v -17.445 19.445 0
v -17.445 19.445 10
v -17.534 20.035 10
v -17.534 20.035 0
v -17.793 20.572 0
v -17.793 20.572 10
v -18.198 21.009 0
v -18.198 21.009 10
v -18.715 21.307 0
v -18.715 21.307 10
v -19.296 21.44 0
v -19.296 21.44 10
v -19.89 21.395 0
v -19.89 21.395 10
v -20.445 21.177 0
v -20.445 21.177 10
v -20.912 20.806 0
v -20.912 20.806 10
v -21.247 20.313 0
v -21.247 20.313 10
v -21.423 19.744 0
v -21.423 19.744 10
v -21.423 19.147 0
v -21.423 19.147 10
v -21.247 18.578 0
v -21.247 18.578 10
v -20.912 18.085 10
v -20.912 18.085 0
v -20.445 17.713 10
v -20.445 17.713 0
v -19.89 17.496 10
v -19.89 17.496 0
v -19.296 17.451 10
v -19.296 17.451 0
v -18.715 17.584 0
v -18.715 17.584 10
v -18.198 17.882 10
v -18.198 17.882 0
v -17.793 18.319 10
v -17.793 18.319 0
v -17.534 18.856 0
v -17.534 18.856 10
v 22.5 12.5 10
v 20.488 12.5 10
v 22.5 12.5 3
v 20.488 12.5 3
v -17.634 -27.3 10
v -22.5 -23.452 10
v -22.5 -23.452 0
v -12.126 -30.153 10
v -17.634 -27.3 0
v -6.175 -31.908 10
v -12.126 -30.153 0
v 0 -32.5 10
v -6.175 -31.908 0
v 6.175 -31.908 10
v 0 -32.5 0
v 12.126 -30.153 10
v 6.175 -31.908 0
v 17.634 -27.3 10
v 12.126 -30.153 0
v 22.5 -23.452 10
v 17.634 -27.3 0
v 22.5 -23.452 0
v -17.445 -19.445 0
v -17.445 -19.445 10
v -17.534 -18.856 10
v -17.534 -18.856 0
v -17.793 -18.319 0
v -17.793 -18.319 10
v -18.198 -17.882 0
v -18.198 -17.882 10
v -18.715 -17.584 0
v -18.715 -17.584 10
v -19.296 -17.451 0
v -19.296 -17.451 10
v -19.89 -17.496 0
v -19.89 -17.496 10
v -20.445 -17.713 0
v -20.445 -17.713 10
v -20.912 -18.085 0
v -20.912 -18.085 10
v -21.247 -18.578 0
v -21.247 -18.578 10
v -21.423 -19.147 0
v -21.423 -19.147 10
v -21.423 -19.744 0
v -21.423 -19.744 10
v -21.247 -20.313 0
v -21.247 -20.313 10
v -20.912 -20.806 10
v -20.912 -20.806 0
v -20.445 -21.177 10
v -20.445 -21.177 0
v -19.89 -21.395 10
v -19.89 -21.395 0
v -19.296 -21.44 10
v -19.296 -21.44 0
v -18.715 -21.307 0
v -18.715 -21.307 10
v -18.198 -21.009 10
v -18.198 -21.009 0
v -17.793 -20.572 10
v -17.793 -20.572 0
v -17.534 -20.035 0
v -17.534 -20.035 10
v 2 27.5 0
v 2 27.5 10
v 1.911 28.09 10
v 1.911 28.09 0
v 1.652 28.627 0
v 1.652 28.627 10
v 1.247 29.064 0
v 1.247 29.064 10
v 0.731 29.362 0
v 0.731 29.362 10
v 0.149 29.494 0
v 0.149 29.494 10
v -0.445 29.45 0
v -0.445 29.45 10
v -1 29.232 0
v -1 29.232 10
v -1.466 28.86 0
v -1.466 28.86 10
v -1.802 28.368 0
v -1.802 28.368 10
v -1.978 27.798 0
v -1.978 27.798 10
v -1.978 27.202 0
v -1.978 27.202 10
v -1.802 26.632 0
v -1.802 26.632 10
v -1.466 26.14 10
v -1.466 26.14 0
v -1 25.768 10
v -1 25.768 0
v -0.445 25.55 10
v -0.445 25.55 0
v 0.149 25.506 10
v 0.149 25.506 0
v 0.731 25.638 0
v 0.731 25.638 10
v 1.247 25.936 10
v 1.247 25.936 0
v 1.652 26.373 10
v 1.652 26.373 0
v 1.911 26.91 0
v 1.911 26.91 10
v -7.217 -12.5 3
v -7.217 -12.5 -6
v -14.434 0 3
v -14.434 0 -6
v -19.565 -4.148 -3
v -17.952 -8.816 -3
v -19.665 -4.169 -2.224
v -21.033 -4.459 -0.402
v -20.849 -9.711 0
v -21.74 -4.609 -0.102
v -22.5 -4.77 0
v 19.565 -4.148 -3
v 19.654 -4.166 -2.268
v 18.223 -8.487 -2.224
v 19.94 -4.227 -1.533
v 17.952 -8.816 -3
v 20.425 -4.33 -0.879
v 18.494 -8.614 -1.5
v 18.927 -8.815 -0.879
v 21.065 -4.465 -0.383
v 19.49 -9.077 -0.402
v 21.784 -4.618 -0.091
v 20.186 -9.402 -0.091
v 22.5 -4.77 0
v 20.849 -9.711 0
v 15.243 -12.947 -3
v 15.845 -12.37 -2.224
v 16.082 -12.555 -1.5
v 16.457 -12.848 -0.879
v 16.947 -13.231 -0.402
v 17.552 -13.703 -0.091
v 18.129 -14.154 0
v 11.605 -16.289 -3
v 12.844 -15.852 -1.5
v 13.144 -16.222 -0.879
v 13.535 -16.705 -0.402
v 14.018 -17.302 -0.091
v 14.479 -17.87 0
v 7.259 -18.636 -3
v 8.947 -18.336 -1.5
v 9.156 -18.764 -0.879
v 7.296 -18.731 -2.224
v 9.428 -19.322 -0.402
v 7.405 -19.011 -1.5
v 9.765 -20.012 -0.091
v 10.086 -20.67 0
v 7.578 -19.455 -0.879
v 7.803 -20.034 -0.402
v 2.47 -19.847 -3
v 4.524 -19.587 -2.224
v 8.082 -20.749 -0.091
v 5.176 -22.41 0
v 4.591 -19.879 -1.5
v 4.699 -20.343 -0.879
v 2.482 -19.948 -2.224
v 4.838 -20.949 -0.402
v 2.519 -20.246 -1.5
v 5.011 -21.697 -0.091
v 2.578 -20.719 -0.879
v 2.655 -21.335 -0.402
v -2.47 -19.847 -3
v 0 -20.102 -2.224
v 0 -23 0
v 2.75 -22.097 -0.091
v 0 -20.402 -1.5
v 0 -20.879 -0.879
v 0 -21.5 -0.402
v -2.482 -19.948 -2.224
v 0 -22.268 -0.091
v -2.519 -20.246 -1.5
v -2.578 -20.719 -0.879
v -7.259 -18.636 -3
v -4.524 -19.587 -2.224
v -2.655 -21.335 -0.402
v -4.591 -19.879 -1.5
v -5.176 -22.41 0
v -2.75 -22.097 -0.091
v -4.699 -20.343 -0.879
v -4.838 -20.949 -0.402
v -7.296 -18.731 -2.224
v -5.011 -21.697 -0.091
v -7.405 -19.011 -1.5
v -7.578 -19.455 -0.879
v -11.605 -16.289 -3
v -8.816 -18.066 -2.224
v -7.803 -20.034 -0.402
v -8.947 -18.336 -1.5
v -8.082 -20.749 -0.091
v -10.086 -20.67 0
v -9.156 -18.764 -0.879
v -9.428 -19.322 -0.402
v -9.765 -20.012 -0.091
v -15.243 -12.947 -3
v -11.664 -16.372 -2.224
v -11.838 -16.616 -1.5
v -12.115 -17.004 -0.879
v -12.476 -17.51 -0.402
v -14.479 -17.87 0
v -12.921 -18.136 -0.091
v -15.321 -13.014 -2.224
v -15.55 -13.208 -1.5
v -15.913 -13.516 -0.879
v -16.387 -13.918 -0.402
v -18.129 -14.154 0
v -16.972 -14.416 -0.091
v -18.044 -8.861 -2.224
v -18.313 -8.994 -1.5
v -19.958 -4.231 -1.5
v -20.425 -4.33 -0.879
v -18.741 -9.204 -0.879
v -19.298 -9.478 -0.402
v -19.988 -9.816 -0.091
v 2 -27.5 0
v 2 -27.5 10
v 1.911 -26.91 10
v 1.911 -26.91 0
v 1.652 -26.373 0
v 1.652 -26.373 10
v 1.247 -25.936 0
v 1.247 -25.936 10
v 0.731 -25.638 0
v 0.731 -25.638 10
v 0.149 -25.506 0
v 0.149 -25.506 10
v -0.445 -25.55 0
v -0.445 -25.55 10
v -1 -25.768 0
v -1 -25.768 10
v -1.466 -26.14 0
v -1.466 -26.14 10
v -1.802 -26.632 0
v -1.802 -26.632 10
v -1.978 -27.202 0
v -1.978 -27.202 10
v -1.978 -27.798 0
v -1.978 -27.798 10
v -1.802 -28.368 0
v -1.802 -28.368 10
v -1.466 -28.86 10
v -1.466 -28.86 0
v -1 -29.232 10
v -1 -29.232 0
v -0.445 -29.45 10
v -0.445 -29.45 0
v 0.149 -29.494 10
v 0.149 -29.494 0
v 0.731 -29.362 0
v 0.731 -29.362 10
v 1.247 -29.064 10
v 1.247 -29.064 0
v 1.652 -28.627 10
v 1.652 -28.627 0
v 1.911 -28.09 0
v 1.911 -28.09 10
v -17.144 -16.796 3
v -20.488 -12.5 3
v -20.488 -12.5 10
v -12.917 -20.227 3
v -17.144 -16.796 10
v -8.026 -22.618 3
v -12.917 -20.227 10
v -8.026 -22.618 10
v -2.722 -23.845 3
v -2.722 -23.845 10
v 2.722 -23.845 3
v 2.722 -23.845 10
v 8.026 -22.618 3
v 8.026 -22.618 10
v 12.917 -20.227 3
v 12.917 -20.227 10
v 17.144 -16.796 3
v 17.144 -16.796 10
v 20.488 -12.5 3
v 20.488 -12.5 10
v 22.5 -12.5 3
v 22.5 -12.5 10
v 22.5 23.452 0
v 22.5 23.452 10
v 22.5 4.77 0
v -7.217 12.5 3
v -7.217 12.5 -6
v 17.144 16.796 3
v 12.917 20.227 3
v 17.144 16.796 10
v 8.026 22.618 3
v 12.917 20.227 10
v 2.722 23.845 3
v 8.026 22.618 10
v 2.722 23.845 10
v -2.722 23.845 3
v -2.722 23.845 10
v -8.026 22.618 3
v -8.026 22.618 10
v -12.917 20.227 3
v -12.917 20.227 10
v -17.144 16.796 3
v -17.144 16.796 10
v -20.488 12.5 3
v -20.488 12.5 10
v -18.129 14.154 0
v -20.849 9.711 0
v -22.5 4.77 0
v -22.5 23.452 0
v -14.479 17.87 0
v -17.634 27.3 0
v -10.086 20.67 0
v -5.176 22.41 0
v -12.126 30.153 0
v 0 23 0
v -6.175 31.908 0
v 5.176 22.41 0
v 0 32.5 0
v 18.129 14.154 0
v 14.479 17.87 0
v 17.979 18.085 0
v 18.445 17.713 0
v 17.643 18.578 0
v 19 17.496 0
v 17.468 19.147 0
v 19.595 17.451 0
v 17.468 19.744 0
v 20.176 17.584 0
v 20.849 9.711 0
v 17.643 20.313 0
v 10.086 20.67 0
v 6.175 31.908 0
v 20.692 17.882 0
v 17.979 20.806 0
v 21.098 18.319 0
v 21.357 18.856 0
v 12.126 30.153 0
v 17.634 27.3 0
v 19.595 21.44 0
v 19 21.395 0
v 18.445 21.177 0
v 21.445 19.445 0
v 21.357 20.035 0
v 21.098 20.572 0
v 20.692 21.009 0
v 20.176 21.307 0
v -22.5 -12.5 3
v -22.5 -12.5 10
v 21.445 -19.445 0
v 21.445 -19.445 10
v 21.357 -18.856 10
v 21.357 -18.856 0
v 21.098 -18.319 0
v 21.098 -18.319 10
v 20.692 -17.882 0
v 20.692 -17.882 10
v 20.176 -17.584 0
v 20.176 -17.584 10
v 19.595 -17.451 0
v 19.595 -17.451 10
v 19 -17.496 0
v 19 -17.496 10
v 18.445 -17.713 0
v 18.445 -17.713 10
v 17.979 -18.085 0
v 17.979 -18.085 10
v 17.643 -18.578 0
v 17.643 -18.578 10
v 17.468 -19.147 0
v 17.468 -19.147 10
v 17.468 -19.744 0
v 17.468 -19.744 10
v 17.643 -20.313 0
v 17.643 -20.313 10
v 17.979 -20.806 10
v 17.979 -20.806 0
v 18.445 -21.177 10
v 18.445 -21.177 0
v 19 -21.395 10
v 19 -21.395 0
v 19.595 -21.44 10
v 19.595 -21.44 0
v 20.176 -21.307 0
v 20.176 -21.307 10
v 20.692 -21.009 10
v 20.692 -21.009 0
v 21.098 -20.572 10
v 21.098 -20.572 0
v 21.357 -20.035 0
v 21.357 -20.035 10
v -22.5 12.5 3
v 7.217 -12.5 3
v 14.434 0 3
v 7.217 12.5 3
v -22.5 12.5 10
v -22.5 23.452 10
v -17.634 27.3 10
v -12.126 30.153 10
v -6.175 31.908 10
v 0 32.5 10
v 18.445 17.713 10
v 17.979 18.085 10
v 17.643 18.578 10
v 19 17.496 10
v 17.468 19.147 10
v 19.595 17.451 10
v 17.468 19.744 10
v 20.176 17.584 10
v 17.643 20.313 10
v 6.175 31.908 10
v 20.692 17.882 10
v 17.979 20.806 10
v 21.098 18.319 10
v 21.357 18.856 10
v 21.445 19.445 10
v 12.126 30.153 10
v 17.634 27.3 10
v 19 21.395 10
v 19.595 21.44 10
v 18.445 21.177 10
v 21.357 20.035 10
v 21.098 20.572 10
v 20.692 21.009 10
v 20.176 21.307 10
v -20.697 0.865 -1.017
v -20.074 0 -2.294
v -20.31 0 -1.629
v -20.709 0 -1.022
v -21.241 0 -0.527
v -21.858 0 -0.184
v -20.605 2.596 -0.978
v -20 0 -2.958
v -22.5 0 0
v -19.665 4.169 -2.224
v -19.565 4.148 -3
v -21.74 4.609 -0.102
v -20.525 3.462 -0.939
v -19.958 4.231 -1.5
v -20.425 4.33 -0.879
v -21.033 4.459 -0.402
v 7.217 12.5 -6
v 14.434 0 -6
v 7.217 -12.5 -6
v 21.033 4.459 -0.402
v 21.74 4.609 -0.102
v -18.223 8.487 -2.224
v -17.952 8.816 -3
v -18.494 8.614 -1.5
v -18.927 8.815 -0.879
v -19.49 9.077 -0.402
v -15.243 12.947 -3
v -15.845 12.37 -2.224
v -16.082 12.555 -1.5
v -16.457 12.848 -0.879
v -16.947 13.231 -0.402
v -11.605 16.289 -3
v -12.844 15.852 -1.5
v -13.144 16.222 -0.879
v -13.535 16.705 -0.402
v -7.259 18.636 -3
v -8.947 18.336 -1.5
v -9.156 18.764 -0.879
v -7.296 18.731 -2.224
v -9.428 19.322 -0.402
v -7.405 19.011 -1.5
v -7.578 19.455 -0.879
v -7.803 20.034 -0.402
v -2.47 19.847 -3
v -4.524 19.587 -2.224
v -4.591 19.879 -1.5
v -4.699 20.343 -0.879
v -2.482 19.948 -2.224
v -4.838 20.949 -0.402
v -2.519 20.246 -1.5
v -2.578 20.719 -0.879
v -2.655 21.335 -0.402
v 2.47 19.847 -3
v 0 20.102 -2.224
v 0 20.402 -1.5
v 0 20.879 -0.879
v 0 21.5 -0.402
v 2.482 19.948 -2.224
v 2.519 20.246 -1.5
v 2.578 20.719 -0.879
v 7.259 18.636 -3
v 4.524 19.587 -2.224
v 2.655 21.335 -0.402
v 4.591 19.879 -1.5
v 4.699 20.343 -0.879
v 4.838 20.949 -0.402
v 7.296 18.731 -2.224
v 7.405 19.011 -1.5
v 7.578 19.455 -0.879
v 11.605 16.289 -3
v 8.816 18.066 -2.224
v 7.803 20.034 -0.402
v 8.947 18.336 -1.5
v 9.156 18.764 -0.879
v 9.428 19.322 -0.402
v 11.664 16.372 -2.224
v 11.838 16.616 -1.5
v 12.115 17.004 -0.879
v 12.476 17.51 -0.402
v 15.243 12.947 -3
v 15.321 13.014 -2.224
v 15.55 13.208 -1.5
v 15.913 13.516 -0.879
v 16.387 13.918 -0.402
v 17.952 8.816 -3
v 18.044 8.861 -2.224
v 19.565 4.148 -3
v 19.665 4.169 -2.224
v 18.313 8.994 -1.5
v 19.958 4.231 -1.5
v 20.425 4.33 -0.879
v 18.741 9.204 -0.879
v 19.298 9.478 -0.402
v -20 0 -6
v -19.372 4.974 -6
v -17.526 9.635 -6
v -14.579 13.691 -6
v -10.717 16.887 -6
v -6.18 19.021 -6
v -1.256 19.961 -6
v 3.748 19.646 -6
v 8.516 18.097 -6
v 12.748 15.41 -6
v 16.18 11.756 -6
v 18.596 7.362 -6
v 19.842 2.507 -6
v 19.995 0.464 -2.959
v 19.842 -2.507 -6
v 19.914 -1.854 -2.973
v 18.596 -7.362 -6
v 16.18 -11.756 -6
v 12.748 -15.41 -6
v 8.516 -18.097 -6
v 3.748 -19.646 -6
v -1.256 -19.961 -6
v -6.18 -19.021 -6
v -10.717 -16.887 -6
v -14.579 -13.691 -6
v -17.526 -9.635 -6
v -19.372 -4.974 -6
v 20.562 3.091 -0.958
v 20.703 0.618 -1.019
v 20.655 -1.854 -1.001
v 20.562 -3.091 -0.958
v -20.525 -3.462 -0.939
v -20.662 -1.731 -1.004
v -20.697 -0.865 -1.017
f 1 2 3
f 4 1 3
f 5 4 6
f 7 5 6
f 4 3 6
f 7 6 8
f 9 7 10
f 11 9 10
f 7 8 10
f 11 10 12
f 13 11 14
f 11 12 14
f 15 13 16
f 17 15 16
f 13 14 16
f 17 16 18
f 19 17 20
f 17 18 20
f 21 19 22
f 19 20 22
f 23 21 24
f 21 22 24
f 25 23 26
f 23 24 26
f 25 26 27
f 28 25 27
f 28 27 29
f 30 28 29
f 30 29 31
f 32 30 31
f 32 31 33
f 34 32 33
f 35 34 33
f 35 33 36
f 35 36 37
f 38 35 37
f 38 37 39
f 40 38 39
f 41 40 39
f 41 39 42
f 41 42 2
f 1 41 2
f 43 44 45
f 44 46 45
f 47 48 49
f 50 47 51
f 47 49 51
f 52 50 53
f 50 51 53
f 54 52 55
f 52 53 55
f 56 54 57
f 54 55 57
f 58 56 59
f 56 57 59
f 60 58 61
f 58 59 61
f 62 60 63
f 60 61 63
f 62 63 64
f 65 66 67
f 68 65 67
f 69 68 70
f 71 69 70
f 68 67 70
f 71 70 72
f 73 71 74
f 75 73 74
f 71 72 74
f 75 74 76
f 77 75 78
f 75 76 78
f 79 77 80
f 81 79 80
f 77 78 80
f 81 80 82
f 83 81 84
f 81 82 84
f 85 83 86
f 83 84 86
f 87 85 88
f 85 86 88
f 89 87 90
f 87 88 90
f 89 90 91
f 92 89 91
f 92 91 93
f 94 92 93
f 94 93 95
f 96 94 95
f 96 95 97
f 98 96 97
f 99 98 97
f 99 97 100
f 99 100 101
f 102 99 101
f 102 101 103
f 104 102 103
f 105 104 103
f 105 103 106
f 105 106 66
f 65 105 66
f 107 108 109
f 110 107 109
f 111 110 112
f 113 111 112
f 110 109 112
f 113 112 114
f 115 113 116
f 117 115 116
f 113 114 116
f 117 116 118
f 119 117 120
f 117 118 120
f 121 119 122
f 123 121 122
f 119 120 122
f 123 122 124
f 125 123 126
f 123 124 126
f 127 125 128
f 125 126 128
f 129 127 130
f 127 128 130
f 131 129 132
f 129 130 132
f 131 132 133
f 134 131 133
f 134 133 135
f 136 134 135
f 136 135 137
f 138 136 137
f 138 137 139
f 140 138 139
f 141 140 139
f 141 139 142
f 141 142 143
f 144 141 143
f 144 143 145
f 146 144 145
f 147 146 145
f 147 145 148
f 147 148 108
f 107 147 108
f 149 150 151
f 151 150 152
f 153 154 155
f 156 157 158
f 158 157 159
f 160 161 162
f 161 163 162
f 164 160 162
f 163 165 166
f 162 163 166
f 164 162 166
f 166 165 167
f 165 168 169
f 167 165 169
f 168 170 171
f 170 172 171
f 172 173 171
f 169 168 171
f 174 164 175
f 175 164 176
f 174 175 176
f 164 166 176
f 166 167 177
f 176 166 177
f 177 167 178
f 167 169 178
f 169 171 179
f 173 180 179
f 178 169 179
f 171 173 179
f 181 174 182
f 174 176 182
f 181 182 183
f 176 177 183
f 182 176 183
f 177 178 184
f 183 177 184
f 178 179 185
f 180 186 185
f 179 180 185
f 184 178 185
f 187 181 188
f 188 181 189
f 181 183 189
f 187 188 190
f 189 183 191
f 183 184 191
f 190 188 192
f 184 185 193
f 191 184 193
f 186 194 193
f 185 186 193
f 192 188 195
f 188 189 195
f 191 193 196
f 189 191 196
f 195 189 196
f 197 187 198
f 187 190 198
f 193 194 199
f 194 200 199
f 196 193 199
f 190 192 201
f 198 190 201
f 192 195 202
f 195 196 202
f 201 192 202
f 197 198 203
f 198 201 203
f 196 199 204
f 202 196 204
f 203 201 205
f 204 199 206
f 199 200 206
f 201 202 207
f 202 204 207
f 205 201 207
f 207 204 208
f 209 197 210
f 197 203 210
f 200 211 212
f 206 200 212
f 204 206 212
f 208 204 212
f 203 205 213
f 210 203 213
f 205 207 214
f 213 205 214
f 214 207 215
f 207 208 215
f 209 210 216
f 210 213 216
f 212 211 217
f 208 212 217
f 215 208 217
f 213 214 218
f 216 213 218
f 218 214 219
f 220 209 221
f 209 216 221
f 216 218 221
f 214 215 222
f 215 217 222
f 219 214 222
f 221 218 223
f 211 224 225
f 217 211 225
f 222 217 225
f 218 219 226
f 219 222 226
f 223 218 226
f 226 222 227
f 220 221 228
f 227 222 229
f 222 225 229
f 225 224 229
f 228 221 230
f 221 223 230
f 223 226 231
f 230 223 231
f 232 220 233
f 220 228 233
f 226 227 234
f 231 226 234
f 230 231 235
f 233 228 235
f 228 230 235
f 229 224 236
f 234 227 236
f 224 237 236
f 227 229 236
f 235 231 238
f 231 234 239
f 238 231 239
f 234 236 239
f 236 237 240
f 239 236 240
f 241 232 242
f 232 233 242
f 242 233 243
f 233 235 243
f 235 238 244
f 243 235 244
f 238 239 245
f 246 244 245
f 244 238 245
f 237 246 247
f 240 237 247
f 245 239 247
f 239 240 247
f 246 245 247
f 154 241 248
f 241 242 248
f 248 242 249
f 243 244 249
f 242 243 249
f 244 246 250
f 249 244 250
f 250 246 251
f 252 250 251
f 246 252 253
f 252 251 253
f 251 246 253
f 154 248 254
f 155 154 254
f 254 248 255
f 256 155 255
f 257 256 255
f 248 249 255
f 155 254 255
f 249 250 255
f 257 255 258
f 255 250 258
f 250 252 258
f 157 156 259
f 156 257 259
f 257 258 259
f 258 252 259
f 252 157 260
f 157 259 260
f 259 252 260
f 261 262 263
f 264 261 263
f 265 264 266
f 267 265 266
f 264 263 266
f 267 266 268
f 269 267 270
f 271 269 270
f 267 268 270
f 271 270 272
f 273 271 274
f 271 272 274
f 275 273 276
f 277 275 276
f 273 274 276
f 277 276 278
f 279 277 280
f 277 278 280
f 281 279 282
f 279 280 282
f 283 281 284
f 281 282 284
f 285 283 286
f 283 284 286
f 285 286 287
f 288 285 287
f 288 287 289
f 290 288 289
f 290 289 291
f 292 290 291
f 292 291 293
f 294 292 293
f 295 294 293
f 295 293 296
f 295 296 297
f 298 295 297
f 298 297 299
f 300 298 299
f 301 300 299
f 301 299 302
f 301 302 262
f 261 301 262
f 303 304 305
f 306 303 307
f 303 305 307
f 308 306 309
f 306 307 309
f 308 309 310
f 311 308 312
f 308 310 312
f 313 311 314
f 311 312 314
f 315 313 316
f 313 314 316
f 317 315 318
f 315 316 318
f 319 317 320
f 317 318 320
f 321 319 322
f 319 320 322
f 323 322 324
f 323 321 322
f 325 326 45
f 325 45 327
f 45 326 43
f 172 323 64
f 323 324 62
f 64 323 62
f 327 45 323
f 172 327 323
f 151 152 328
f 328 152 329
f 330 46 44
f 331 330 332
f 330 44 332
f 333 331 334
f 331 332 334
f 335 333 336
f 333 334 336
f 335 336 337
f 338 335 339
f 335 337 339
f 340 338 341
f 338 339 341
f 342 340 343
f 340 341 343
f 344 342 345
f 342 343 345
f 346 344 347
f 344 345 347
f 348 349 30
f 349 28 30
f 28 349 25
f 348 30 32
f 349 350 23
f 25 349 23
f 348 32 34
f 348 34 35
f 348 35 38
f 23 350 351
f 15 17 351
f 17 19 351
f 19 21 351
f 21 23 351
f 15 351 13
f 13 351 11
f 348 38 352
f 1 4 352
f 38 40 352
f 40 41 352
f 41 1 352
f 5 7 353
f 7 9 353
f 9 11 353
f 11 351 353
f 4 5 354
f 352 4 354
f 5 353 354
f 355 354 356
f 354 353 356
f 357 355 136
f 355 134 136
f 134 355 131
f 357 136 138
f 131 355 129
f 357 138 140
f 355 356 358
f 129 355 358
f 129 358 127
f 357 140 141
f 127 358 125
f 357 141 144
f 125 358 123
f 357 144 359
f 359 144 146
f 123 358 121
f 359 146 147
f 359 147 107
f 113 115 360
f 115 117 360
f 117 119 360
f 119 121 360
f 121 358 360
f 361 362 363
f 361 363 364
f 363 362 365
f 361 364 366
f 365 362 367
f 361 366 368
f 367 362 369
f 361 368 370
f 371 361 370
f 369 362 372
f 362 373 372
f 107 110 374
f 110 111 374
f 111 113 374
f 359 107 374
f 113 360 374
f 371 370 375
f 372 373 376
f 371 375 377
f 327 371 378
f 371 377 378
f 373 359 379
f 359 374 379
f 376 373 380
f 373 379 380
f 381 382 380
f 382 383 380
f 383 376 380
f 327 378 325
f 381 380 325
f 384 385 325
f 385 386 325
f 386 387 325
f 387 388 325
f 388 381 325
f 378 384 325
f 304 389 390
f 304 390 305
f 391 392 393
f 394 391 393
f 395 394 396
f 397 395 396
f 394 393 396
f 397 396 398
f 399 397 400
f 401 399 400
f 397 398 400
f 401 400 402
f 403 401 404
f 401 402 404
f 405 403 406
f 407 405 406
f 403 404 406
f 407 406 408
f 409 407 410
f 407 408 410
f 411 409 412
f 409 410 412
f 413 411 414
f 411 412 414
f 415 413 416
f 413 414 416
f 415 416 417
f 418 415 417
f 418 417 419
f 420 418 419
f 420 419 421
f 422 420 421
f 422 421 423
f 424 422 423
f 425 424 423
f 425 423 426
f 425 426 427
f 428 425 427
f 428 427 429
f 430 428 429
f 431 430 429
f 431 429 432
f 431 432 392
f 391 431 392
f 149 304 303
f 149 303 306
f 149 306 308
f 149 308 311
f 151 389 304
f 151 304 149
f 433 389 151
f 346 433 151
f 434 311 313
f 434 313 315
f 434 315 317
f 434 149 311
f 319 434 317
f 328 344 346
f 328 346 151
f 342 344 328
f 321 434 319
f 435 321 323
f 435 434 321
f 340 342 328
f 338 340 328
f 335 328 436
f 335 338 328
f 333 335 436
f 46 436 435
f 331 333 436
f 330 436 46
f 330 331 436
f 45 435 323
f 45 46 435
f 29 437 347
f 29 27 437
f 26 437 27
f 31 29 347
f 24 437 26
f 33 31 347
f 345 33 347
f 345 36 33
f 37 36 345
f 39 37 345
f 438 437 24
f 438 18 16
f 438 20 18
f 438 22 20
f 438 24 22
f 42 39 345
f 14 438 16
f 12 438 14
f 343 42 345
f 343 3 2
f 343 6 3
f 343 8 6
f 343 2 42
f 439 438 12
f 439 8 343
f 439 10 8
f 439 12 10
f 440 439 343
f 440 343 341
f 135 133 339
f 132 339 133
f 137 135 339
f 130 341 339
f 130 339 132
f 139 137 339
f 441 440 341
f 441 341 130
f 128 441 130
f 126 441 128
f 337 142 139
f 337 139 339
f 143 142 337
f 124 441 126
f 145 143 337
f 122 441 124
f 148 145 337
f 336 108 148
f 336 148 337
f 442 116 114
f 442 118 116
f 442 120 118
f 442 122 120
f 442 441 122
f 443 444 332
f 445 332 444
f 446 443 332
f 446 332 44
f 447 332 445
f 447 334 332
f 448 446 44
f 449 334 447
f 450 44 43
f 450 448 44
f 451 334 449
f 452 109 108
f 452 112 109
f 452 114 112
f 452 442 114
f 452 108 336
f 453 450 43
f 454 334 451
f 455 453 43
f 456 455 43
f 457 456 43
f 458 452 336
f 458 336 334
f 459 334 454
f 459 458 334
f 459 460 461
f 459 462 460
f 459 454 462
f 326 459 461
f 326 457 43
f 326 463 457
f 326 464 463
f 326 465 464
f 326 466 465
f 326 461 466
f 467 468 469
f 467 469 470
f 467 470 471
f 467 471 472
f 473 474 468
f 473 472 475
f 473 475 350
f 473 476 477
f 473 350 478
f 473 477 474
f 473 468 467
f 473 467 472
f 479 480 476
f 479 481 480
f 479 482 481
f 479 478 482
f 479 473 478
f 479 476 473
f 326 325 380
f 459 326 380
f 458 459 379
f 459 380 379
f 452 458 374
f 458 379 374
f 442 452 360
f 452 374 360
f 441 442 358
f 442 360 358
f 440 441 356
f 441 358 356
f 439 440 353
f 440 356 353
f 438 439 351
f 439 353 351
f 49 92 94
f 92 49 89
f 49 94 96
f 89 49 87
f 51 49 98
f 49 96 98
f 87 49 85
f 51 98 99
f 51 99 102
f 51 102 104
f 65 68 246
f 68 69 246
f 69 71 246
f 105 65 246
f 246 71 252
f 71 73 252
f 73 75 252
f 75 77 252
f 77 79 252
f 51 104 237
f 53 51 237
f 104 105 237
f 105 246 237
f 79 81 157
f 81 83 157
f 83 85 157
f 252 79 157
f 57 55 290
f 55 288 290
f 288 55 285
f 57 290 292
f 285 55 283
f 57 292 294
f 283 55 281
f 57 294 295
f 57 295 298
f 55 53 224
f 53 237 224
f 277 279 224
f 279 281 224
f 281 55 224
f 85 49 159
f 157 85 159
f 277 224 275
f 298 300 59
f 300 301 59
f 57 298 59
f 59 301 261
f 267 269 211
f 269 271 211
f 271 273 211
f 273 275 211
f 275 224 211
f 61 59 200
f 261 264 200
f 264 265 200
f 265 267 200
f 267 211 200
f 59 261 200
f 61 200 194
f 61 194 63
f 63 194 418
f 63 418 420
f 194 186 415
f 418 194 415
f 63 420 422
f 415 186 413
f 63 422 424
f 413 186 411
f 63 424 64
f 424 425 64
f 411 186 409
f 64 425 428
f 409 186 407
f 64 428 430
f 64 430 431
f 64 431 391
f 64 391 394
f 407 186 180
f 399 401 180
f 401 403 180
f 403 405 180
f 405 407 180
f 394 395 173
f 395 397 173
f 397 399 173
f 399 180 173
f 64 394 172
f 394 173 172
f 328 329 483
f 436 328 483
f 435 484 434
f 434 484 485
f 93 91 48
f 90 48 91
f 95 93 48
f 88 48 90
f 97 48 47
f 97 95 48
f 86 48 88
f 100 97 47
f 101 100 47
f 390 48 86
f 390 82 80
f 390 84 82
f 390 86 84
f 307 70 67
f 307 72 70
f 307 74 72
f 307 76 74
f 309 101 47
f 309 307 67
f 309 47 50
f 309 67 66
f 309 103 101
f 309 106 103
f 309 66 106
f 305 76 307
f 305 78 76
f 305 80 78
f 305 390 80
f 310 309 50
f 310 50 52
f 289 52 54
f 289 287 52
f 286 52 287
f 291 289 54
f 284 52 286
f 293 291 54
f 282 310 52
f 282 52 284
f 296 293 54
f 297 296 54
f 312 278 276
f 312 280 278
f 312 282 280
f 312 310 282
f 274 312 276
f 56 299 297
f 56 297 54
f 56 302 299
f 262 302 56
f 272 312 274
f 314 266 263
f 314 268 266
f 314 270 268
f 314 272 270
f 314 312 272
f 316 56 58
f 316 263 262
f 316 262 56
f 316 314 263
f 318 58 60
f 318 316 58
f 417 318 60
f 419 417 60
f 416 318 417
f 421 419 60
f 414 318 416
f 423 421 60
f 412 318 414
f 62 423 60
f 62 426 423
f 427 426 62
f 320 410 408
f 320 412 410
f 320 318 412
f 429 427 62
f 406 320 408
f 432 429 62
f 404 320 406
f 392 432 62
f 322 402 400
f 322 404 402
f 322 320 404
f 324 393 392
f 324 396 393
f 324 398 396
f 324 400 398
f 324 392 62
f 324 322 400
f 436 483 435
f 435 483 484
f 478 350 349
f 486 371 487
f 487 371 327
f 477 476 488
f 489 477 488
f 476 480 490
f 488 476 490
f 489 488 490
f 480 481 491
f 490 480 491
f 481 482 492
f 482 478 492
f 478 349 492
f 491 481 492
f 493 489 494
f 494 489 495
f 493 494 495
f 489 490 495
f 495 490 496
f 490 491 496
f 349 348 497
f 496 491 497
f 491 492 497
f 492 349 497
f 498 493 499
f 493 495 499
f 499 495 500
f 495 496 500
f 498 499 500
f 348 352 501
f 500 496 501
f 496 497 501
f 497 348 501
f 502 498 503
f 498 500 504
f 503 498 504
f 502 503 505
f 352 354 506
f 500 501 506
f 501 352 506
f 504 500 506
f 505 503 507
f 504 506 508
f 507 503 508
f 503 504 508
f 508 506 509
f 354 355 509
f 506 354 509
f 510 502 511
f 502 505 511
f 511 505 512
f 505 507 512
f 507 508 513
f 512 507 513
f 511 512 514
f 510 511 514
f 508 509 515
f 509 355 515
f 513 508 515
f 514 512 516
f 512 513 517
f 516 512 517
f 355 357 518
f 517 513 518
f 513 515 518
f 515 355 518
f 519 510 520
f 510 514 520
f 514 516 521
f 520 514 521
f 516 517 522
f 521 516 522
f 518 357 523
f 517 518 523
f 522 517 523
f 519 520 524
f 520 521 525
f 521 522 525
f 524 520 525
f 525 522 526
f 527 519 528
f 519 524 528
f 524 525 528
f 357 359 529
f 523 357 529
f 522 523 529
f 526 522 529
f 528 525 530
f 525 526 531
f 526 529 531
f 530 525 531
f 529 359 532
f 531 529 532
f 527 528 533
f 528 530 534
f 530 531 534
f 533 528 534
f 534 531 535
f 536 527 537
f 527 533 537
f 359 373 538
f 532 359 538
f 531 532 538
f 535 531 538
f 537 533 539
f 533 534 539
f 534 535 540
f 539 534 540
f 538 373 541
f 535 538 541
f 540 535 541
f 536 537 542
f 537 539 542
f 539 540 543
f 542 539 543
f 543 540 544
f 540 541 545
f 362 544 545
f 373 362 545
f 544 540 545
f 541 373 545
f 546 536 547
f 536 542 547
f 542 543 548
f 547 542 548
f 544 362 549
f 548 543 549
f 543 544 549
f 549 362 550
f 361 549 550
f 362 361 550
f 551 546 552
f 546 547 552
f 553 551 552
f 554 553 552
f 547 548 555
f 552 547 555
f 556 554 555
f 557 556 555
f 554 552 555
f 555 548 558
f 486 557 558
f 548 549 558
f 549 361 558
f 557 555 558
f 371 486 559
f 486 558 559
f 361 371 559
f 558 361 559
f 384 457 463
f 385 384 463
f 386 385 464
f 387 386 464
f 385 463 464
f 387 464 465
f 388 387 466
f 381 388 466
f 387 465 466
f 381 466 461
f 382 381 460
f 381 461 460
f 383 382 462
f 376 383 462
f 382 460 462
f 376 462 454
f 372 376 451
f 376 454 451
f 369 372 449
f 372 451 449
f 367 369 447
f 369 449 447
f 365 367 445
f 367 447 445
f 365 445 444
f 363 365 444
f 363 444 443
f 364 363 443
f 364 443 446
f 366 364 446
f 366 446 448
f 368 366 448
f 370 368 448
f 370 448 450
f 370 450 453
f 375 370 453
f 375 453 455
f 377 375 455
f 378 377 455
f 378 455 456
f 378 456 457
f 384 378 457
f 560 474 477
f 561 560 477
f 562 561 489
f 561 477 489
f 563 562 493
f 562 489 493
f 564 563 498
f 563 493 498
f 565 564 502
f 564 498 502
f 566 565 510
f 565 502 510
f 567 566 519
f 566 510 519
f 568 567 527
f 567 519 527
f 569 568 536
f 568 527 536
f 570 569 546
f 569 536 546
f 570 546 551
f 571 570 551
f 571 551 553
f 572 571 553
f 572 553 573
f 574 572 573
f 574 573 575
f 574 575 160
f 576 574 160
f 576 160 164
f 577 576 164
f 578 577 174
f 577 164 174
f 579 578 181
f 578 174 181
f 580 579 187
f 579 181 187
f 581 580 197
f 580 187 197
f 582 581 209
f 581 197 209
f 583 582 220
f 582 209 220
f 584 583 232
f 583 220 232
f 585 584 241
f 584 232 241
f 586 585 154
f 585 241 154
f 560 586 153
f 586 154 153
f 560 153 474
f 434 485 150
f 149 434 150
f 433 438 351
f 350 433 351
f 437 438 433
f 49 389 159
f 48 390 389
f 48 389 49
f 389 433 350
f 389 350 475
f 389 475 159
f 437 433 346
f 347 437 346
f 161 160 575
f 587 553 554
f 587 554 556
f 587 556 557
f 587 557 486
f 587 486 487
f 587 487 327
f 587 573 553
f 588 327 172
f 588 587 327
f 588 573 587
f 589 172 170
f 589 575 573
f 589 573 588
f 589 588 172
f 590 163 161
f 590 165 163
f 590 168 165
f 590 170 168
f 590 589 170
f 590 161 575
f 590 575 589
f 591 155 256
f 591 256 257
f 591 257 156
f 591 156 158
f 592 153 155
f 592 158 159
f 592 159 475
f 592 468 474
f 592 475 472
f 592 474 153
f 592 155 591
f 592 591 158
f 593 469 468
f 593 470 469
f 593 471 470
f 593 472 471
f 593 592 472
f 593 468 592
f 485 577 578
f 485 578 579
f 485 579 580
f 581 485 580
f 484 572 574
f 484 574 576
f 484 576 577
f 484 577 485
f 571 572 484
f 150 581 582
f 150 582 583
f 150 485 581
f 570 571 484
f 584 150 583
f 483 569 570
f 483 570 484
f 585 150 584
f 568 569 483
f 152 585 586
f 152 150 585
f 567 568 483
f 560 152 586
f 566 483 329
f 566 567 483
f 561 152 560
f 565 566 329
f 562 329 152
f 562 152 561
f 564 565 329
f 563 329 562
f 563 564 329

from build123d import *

# Parameters (mm, degrees)
SKETCH1_R           = 32.5
BOSS_EXTRUDE1_DEPTH = 10
CUT_EXTRUDE1_DEPTH  = 5
SKETCH3_R           = 2
CUT_EXTRUDE2_DEPTH  = 11
SKETCH4_R           = 20
BOSS_EXTRUDE2_DEPTH = 6
CUT_EXTRUDE3_DEPTH  = 17
SKETCH6_R           = 24
CUT_EXTRUDE5_DEPTH  = 7
CUT_EXTRUDE6_DEPTH  = 11
SKETCH8_W           = 45
SKETCH8_H           = 25
CUT_EXTRUDE7_DEPTH  = 8
FILLET1_R           = 3


with BuildPart() as part:
    # Sketch1 → Boss-Extrude1 (new body)
    with BuildSketch(Plane.XY):
        Circle(SKETCH1_R)
    extrude(amount=BOSS_EXTRUDE1_DEPTH)

    # Sketch2 → Cut-Extrude1 (cut)
    with BuildSketch(Plane.XY.offset(10)):
        Polygon((14.43375673, 0), (7.216878365, 12.5), (-7.216878365, 12.5), (-14.43375673, 0), (-7.216878365, -12.5), (7.216878365, -12.5), align=None)
    extrude(amount=-CUT_EXTRUDE1_DEPTH, mode=Mode.SUBTRACT)

    # Sketch3 → Cut-Extrude2 (cut, through all)
    with BuildSketch(Plane.XY.offset(10)):
        with Locations((0, 27.5)):
            Circle(SKETCH3_R)
        with Locations((19.445436483, 19.445436483)):
            Circle(SKETCH3_R)
        with Locations((27.5, 0)):
            Circle(SKETCH3_R)
        with Locations((19.445436483, -19.445436483)):
            Circle(SKETCH3_R)
        with Locations((0, -27.5)):
            Circle(SKETCH3_R)
        with Locations((-19.445436483, -19.445436483)):
            Circle(SKETCH3_R)
        with Locations((-27.5, 0)):
            Circle(SKETCH3_R)
        with Locations((-19.445436483, 19.445436483)):
            Circle(SKETCH3_R)
    extrude(amount=-CUT_EXTRUDE2_DEPTH, mode=Mode.SUBTRACT)

    # Sketch4 → Boss-Extrude2 (add)
    with BuildSketch(Plane(origin=(0, 0, 0), x_dir=(-1, 0, 0), z_dir=(0, 0, -1))):
        Circle(SKETCH4_R)
        Polygon((14.43375673, 0), (7.216878365, 12.5), (-7.216878365, 12.5), (-14.43375673, 0), (-7.216878365, -12.5), (7.216878365, -12.5), align=None, mode=Mode.SUBTRACT)
    extrude(amount=BOSS_EXTRUDE2_DEPTH)

    # Sketch5 → Cut-Extrude3 (cut, through all)
    with BuildSketch(Plane.XY.offset(10)):
        with BuildLine():
            Line((22.5, 23.452078799), (22.5, -23.452078799))
            ThreePointArc((22.5, -23.452078799), (32.5, 0), (22.5, 23.452078799))
        make_face()
        with BuildLine():
            Line((-22.5, 23.452078799), (-22.5, -23.452078799))
            ThreePointArc((-22.5, -23.452078799), (-32.5, 0), (-22.5, 23.452078799))
        make_face()
    extrude(amount=-CUT_EXTRUDE3_DEPTH, mode=Mode.SUBTRACT)

    # Sketch6 → Cut-Extrude5 (cut)
    with BuildSketch(Plane.XY.offset(10)):
        Circle(SKETCH6_R)
    extrude(amount=-CUT_EXTRUDE5_DEPTH, mode=Mode.SUBTRACT)

    # Sketch7 → Cut-Extrude6 (cut, through all)
    with BuildSketch(Plane(origin=(0, 0, 0), x_dir=(-1, 0, 0), z_dir=(0, 0, -1))):
        Polygon((14.43375673, 0), (7.216878365, 12.5), (-7.216878365, 12.5), (-14.43375673, 0), (-7.216878365, -12.5), (7.216878365, -12.5), align=None)
    extrude(amount=-CUT_EXTRUDE6_DEPTH, mode=Mode.SUBTRACT)

    # Sketch8 → Cut-Extrude7 (cut, through all)
    with BuildSketch(Plane.XY.offset(3)):
        Rectangle(SKETCH8_W, SKETCH8_H)
    extrude(amount=CUT_EXTRUDE7_DEPTH, mode=Mode.SUBTRACT)

    # Fillet1
    fillet1_edges = [part.edges().sort_by_distance(p)[0] for p in [
        (20, 0, 0),
    ]]
    fillet(fillet1_edges, radius=FILLET1_R)


solid = part.part
